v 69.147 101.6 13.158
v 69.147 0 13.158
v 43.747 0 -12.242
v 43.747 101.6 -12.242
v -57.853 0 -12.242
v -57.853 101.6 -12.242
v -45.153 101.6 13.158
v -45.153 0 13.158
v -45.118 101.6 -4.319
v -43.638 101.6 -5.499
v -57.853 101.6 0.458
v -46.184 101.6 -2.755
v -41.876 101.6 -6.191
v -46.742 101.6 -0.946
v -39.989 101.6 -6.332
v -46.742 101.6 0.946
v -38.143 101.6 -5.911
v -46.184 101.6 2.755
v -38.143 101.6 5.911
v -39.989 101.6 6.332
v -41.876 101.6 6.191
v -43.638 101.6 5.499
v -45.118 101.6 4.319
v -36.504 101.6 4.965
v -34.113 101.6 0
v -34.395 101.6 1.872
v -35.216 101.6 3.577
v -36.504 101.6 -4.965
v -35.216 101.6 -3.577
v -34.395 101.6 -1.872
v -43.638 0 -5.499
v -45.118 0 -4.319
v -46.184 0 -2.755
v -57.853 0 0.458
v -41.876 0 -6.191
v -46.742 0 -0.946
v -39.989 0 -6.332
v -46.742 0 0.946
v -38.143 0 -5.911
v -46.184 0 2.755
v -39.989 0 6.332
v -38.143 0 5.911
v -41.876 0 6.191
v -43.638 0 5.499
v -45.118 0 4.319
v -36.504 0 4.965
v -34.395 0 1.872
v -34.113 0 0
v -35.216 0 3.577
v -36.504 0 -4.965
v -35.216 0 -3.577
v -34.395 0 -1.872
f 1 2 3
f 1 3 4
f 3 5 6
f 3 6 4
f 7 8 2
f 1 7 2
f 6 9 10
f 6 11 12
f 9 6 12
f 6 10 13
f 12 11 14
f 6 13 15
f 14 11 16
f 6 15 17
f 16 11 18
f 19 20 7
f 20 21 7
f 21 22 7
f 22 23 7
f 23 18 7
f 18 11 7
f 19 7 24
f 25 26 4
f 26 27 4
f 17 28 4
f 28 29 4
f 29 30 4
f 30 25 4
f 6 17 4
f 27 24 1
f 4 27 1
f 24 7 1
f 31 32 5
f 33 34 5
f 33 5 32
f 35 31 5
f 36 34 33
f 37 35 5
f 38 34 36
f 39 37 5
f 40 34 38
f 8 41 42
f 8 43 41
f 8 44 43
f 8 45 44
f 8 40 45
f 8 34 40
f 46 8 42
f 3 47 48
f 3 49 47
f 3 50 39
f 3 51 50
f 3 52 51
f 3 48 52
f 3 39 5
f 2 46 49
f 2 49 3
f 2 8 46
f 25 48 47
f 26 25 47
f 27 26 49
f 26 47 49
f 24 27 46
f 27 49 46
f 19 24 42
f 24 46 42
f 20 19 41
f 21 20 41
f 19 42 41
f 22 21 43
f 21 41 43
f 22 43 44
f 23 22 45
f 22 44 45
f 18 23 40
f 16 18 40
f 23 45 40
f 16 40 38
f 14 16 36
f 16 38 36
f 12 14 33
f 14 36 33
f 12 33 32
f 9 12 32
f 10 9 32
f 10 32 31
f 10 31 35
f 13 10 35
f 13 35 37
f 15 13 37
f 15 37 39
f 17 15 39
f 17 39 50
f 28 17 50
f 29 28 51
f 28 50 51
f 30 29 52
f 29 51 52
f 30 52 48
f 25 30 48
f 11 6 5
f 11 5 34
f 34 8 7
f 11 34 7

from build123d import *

# Parameters (mm, degrees)
F0_W     = 127
F0_H     = 25.4
F0_R     = 6.35
F1_DEPTH = 101.6
F2_SIZE  = 25.39999
F3_SIZE  = 12.7


# Not quite as in the source:
# - a fillet or chamfer is up to 0.001 mm smaller than in the source, because OpenCascade refuses the exact size


with BuildPart() as f1:
    # F0 (on Front) → F1 (new body)
    with BuildSketch(Plane.XZ):
        with Locations((5.6473743348, 0.4580724053)):
            Rectangle(F0_W, F0_H)
        with Locations((-40.4630713165, 0)):
            Circle(F0_R, mode=Mode.SUBTRACT)
    extrude(amount=-F1_DEPTH)

    # F2 (size 25.4 in the source; OpenCascade refuses exactly that, so slightly less here)
    f2_edges = [f1.edges().sort_by_distance(p)[0] for p in [
        (69.147374, 50.8, -12.241928),
    ]]
    chamfer(f2_edges, length=F2_SIZE)

    # F3
    f3_edges = [f1.edges().sort_by_distance(p)[0] for p in [
        (-57.852626, 50.8, 13.158072),
    ]]
    chamfer(f3_edges, length=F3_SIZE)


solid = f1.part
